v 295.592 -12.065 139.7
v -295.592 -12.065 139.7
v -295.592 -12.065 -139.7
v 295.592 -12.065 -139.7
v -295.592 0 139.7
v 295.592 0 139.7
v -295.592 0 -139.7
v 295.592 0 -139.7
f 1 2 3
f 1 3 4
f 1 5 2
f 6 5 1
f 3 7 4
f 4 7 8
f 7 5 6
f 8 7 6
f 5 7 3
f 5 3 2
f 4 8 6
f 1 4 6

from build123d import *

# Parameters (mm, degrees)
F0_W     = 603.25
F0_H     = 279.4
F2_DEPTH = 12.065
F3_DEPTH = 6.0325
F4_DEPTH = 6.0325


# Not quite as in the source:
# - a variable given as a bare number and used for a length is read in inches; the dataset says mm whatever the document's units were


with BuildPart() as f2:
    # F0 (on Front) → F2 (new body)
    with BuildSketch(Plane.XZ):
        Rectangle(F0_W, F0_H)
    extrude(amount=F2_DEPTH)

    # F3 (cut): a face of the model
    f3_faces = [f2.faces().sort_by_distance(p)[0] for p in [
        (301.625, -6.0325, 0),
    ]]
    extrude(f3_faces, amount=-F3_DEPTH, mode=Mode.SUBTRACT)

    # F4 (cut): a face of the model
    f4_faces = [f2.faces().sort_by_distance(p)[0] for p in [
        (-301.625, -6.0325, 0),
    ]]
    extrude(f4_faces, amount=-F4_DEPTH, mode=Mode.SUBTRACT)


solid = f2.part
